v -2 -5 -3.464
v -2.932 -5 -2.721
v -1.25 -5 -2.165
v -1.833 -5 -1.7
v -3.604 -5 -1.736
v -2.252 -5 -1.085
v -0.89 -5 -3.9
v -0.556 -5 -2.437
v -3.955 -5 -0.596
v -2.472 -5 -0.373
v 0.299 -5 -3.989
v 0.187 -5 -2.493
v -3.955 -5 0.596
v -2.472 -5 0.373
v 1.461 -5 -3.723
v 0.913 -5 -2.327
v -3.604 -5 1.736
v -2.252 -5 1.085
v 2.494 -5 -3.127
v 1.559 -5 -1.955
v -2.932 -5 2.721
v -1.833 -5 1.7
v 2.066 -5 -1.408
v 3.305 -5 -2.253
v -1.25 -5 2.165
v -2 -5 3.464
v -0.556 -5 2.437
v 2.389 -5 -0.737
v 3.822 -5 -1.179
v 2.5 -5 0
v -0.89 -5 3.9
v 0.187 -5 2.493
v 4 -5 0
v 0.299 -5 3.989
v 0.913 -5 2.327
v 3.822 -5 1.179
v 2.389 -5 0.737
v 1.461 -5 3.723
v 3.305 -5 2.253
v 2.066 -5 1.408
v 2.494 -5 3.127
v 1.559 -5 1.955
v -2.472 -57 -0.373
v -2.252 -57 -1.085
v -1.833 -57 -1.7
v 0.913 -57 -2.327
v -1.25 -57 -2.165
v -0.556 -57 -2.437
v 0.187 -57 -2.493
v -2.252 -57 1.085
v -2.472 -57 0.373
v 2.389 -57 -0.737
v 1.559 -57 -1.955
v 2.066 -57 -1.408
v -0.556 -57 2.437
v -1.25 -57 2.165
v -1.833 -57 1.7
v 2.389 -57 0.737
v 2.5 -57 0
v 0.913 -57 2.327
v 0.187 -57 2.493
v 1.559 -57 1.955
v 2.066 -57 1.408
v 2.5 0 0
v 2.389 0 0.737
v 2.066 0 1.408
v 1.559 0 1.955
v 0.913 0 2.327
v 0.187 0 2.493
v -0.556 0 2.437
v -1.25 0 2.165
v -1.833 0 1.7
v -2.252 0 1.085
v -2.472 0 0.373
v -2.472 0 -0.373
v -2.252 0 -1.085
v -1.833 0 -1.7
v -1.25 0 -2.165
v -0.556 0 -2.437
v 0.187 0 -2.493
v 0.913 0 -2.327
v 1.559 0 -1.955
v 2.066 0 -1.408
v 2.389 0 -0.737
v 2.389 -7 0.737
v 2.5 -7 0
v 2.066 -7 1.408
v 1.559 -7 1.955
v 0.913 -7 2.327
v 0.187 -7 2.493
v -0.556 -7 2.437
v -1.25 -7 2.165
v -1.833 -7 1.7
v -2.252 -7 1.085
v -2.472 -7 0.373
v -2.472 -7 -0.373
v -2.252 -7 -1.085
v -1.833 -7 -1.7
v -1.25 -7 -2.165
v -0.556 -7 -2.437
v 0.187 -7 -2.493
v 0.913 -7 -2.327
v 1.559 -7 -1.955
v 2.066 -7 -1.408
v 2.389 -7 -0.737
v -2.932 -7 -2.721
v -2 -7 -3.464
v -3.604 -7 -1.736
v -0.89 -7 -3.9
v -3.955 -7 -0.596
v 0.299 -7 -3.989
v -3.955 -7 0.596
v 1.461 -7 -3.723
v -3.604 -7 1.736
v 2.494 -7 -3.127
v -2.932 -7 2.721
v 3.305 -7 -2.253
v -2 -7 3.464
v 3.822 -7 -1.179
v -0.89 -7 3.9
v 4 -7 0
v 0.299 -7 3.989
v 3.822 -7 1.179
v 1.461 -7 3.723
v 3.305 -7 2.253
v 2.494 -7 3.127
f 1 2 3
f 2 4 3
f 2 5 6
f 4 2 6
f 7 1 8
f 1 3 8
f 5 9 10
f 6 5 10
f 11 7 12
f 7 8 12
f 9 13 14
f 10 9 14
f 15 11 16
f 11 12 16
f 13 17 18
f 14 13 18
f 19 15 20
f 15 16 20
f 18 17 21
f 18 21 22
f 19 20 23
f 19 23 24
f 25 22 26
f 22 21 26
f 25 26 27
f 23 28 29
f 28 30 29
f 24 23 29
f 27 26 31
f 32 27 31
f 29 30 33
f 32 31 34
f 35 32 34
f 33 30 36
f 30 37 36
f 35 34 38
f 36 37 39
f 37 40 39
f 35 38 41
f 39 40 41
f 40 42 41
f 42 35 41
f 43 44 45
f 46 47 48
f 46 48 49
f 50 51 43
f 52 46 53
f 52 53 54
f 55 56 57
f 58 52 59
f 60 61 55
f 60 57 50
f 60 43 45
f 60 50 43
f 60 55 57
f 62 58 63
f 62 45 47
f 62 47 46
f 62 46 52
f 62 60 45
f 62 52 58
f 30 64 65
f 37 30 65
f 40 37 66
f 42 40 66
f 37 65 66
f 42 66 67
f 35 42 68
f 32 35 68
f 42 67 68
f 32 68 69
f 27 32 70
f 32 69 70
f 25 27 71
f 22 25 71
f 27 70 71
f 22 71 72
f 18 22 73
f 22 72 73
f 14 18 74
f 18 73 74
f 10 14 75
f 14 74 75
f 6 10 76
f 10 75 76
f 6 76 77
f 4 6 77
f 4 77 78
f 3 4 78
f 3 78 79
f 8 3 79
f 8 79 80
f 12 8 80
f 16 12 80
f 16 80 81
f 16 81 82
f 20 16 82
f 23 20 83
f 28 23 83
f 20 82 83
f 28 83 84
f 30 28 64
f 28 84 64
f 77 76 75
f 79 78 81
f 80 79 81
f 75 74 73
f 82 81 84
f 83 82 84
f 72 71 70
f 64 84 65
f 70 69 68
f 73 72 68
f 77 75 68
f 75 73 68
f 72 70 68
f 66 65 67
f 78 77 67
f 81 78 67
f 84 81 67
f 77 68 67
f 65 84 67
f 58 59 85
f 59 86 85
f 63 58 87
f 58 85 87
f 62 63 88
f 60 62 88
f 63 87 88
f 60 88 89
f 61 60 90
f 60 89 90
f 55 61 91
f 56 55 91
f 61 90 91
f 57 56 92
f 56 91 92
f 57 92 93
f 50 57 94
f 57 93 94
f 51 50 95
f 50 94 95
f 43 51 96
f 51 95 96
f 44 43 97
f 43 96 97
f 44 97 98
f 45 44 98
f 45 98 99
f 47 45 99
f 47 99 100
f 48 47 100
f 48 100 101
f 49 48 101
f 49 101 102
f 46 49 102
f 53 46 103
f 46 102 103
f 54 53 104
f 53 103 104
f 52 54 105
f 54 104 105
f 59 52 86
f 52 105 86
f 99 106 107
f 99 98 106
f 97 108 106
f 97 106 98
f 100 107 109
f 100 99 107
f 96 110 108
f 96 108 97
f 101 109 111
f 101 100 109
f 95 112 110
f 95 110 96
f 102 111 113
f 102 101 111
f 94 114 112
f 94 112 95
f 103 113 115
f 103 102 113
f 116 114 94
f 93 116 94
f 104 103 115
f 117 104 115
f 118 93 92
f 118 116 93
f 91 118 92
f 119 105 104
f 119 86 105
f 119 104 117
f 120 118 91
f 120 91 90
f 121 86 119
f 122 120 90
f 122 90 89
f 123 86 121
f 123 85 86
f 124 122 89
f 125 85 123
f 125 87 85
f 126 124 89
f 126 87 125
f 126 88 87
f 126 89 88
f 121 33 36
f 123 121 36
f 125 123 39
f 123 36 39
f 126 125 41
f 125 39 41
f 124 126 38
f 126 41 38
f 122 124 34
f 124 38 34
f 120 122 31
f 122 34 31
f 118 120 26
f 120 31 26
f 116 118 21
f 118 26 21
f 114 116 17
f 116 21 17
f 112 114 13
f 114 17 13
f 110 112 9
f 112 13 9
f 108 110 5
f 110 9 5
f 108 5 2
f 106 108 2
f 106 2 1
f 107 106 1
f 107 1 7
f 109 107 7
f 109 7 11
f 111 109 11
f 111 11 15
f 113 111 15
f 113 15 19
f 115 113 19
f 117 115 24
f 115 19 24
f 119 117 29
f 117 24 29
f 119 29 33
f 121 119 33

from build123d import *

# Parameters (mm, degrees)
F0_R     = 2.5
F1_DEPTH = 5
F2_R     = 4
F3_DEPTH = 2
F4_R     = 2.5
F5_DEPTH = 25
F6_DEPTH = 25


with BuildPart() as f1:
    # F0 (on Front) → F1 (new body)
    with BuildSketch(Plane.XZ):
        Circle(F0_R)
    extrude(amount=F1_DEPTH)

    # F2 (on face) → F3 (join)
    with BuildSketch(Plane.XZ.offset(5)):
        Circle(F2_R)
    extrude(amount=F3_DEPTH)

    # F4 (on face) → F5 (join)
    with BuildSketch(Plane.XZ.offset(7)):
        Circle(F4_R)
    extrude(amount=F5_DEPTH)

    # F6 (add): a face of the model
    f6_faces = [f1.faces().sort_by_distance(p)[0] for p in [
        (0, -32, 0),
    ]]
    extrude(f6_faces, amount=F6_DEPTH)


solid = f1.part
